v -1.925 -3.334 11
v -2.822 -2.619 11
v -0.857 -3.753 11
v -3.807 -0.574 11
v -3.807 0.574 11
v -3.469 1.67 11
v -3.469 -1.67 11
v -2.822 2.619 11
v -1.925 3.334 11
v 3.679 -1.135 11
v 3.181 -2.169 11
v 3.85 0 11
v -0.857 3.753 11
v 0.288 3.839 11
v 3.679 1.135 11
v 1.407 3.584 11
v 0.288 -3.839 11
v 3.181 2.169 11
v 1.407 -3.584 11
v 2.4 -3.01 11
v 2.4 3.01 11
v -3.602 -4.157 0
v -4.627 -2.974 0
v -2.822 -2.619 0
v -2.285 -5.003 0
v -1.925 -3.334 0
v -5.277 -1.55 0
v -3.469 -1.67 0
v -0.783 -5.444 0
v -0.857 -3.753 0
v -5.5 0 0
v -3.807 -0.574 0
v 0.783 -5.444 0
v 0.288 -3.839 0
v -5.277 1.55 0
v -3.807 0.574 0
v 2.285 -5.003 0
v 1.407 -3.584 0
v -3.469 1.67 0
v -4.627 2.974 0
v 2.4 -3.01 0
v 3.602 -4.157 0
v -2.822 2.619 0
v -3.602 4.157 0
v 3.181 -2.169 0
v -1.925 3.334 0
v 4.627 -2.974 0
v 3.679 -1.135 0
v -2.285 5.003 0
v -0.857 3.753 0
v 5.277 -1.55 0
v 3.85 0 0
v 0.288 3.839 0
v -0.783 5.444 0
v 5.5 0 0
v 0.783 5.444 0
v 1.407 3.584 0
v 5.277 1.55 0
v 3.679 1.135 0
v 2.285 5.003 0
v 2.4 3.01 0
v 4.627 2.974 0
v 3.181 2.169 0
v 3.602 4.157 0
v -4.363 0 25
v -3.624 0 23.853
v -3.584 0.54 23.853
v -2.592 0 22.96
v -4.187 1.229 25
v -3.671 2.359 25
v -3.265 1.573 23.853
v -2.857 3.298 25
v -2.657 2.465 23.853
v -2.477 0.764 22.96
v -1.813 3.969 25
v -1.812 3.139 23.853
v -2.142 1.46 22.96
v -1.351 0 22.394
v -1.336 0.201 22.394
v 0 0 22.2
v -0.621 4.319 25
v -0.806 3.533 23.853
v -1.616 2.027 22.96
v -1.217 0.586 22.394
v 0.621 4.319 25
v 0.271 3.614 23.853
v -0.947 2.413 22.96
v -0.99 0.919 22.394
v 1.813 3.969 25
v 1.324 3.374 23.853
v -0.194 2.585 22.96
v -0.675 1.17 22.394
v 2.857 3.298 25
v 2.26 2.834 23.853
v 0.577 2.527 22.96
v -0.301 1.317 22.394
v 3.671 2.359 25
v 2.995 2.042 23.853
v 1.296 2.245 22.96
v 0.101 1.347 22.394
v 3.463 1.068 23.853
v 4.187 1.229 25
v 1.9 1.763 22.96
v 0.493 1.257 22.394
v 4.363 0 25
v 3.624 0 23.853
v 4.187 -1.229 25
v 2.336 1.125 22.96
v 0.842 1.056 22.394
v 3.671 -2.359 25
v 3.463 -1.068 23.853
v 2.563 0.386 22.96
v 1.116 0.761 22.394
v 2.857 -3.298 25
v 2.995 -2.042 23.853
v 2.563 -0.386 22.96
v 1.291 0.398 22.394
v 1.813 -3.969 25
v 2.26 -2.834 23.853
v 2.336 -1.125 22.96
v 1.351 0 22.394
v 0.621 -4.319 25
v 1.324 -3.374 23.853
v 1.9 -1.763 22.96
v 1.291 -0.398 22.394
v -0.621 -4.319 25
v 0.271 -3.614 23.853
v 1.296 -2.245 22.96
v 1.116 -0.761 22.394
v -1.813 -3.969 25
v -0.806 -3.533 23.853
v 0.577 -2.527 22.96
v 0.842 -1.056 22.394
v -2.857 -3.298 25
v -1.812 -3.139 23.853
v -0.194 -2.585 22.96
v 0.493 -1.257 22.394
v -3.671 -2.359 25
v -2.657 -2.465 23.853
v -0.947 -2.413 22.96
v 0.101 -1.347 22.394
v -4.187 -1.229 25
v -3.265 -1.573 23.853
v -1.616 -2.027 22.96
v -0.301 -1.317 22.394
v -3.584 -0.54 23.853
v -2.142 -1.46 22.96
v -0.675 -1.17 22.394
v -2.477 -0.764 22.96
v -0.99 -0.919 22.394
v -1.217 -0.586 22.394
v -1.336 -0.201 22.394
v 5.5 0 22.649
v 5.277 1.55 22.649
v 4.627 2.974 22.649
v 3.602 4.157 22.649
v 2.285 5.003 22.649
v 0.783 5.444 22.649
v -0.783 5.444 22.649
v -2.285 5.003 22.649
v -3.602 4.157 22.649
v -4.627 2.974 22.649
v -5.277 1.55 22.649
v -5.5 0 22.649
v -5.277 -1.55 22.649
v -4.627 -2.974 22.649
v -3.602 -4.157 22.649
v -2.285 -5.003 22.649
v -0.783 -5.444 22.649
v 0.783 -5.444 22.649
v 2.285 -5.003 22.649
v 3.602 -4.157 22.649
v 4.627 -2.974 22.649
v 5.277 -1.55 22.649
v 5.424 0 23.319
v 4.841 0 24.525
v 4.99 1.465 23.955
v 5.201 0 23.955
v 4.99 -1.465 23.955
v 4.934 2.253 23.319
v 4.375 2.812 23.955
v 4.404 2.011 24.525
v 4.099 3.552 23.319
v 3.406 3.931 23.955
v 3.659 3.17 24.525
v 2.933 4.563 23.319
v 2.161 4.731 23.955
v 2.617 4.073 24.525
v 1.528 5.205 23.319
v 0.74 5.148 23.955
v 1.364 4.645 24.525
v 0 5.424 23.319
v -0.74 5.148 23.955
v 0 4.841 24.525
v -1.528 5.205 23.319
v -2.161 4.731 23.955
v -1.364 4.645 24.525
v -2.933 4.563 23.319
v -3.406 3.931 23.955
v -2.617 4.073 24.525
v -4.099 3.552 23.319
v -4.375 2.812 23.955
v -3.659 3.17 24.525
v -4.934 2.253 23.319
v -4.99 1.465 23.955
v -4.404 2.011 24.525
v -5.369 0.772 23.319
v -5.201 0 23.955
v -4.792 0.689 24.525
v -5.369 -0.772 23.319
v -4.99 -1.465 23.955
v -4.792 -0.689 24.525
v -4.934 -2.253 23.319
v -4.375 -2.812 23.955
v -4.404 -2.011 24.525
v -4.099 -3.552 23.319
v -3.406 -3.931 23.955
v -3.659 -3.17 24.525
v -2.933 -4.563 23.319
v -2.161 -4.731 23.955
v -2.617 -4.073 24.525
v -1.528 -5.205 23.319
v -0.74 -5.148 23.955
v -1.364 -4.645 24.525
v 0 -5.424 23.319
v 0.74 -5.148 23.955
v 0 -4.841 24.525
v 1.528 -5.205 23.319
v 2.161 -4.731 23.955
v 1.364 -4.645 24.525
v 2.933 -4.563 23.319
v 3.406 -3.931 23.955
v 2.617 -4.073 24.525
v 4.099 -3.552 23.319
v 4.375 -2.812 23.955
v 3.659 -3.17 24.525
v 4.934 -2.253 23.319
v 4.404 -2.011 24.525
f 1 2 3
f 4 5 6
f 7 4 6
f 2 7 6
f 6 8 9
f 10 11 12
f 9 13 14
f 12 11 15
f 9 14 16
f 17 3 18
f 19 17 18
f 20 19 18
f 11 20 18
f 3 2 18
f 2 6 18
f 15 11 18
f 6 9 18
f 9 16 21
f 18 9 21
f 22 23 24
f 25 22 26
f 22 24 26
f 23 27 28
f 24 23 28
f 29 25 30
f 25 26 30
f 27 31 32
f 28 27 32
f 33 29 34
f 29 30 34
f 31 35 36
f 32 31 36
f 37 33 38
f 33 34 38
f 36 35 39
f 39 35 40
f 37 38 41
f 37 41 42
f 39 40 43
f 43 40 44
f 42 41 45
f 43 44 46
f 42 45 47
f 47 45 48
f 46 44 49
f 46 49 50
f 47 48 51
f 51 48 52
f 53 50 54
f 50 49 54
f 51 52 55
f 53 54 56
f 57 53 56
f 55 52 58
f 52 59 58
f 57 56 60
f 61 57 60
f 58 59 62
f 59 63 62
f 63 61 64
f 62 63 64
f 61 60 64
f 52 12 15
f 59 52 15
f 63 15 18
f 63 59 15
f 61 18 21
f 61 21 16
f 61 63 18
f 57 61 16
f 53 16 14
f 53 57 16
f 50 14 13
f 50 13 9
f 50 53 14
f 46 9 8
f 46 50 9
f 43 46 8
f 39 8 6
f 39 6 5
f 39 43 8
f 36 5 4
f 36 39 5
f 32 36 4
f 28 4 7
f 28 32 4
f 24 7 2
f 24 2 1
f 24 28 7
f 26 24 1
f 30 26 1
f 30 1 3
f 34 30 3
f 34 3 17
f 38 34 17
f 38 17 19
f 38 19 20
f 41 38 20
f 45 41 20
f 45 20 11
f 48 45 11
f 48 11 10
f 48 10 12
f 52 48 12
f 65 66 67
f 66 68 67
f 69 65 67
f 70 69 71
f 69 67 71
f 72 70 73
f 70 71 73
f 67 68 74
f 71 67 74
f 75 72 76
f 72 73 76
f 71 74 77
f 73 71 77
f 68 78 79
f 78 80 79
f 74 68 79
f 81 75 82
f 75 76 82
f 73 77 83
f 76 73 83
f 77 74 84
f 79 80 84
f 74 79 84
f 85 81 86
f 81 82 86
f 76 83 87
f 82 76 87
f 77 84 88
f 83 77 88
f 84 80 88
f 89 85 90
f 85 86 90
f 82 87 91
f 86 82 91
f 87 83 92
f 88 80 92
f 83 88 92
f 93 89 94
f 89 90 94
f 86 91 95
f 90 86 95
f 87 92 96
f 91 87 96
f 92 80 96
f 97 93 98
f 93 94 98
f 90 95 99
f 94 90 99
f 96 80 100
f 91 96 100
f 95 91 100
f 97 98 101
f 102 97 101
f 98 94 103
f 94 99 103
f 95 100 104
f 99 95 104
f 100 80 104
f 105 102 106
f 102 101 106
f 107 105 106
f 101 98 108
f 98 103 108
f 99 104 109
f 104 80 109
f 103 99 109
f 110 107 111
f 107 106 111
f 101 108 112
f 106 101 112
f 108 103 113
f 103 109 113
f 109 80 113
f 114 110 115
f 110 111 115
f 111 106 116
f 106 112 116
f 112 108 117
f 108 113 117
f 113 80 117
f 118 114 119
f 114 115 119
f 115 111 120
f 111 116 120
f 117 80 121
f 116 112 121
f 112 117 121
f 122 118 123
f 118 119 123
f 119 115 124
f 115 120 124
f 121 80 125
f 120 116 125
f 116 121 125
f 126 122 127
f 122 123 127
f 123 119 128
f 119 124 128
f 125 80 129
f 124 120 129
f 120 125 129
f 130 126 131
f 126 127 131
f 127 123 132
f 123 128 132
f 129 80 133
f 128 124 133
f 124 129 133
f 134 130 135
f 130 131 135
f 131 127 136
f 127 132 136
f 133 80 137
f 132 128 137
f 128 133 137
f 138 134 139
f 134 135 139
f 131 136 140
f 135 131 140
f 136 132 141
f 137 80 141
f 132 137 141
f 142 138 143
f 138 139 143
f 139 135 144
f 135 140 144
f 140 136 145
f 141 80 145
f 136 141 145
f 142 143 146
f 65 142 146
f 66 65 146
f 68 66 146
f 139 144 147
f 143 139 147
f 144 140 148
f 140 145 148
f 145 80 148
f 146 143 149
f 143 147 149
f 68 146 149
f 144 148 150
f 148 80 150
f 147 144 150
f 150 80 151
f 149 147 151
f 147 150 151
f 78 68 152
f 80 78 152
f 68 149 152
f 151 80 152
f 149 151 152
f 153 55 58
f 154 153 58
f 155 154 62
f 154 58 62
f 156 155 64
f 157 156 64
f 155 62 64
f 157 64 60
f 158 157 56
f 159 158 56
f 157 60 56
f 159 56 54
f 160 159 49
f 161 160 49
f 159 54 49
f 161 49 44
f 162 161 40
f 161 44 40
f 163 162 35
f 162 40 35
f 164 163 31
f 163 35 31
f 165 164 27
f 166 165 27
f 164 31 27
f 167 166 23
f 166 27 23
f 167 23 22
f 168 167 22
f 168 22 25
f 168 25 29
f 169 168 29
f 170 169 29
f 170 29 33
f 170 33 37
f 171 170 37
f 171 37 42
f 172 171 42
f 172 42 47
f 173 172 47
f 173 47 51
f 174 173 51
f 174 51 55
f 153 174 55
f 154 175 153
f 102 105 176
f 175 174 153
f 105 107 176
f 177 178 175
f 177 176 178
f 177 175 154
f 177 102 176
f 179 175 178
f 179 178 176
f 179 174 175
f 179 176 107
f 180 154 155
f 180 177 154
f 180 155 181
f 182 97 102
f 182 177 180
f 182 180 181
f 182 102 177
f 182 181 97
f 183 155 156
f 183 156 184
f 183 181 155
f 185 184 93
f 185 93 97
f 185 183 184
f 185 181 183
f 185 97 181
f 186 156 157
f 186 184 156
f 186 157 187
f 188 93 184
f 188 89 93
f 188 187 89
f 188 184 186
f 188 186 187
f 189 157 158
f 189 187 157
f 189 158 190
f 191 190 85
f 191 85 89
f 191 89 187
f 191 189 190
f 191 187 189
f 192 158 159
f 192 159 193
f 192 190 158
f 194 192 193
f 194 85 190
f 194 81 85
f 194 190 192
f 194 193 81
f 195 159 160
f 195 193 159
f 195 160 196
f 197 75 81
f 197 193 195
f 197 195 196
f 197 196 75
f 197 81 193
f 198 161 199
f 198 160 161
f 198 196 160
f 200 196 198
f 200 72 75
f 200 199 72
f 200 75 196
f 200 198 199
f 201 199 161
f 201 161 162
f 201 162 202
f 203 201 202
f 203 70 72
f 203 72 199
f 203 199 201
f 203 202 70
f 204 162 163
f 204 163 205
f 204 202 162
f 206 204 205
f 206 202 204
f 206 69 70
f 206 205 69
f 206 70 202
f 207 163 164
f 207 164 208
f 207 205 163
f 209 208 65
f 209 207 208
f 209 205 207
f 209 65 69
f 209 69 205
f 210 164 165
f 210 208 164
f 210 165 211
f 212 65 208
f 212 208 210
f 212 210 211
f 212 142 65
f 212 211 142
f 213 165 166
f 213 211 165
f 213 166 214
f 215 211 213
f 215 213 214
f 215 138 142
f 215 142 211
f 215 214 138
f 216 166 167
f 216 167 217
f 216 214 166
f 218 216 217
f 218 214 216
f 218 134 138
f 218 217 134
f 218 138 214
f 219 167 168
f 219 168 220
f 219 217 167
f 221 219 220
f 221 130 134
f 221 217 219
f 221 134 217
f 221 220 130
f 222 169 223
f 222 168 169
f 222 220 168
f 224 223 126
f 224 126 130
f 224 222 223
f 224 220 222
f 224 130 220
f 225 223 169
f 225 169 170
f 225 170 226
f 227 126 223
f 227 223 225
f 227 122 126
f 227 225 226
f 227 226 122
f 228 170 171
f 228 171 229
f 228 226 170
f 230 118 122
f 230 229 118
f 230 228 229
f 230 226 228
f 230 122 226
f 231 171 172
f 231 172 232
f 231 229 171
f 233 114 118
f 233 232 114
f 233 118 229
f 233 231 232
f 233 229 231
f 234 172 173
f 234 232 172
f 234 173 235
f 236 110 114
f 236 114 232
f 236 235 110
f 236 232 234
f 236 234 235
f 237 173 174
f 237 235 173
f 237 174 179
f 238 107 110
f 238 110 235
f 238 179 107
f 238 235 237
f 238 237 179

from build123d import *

# Parameters (mm, degrees)
F0_R     = 5.5
F0_R_2   = 3.85
F1_DEPTH = 25
F2_START = 11
F2_DEPTH = 14


# Not quite as in the source:
# - a fillet or chamfer that OpenCascade refuses, or shapes differently, is made with other operations: its cross-section is extruded or revolved along the edge and cut away or added


with BuildPart() as f1:
    # F0 (on Top) → F1 (new body)
    with BuildSketch(Plane.XY):
        Circle(F0_R)
        Circle(F0_R_2, mode=Mode.SUBTRACT)
    extrude(amount=F1_DEPTH)

    # F0 (on Top) → F2 (join)
    with BuildSketch(Plane.XY.offset(F2_START)):
        Circle(F0_R_2)
    extrude(amount=F2_DEPTH)

    # F3 (on Front) → F4 (revolve, cut)
    with BuildSketch(Plane.XZ):
        with BuildLine():
            Line((0, 22.2), (0, 31.8))
            ThreePointArc((0, 31.8), (-4.8, 27), (0, 22.2))
        make_face()
    revolve(axis=Axis((0, 0, 27), (0, 0, -1)), mode=Mode.SUBTRACT)

    # F5: fillet of radius 3 on 1 edges, made by hand

    # F5_s1 → F5_t2 (revolve, cut)
    with BuildSketch(Plane.XZ):
        with BuildLine():
            ThreePointArc((5.5, 22.6489525251), (5.2009678393, 23.9546219822), (4.3634848459, 25))
            Line((4.3634848459, 25), (5.5, 25))
            Line((5.5, 25), (5.5, 22.6489525251))
        make_face()
    revolve(axis=Axis((0, 0, 25), (0, 0, 1)), mode=Mode.SUBTRACT)


solid = f1.part
